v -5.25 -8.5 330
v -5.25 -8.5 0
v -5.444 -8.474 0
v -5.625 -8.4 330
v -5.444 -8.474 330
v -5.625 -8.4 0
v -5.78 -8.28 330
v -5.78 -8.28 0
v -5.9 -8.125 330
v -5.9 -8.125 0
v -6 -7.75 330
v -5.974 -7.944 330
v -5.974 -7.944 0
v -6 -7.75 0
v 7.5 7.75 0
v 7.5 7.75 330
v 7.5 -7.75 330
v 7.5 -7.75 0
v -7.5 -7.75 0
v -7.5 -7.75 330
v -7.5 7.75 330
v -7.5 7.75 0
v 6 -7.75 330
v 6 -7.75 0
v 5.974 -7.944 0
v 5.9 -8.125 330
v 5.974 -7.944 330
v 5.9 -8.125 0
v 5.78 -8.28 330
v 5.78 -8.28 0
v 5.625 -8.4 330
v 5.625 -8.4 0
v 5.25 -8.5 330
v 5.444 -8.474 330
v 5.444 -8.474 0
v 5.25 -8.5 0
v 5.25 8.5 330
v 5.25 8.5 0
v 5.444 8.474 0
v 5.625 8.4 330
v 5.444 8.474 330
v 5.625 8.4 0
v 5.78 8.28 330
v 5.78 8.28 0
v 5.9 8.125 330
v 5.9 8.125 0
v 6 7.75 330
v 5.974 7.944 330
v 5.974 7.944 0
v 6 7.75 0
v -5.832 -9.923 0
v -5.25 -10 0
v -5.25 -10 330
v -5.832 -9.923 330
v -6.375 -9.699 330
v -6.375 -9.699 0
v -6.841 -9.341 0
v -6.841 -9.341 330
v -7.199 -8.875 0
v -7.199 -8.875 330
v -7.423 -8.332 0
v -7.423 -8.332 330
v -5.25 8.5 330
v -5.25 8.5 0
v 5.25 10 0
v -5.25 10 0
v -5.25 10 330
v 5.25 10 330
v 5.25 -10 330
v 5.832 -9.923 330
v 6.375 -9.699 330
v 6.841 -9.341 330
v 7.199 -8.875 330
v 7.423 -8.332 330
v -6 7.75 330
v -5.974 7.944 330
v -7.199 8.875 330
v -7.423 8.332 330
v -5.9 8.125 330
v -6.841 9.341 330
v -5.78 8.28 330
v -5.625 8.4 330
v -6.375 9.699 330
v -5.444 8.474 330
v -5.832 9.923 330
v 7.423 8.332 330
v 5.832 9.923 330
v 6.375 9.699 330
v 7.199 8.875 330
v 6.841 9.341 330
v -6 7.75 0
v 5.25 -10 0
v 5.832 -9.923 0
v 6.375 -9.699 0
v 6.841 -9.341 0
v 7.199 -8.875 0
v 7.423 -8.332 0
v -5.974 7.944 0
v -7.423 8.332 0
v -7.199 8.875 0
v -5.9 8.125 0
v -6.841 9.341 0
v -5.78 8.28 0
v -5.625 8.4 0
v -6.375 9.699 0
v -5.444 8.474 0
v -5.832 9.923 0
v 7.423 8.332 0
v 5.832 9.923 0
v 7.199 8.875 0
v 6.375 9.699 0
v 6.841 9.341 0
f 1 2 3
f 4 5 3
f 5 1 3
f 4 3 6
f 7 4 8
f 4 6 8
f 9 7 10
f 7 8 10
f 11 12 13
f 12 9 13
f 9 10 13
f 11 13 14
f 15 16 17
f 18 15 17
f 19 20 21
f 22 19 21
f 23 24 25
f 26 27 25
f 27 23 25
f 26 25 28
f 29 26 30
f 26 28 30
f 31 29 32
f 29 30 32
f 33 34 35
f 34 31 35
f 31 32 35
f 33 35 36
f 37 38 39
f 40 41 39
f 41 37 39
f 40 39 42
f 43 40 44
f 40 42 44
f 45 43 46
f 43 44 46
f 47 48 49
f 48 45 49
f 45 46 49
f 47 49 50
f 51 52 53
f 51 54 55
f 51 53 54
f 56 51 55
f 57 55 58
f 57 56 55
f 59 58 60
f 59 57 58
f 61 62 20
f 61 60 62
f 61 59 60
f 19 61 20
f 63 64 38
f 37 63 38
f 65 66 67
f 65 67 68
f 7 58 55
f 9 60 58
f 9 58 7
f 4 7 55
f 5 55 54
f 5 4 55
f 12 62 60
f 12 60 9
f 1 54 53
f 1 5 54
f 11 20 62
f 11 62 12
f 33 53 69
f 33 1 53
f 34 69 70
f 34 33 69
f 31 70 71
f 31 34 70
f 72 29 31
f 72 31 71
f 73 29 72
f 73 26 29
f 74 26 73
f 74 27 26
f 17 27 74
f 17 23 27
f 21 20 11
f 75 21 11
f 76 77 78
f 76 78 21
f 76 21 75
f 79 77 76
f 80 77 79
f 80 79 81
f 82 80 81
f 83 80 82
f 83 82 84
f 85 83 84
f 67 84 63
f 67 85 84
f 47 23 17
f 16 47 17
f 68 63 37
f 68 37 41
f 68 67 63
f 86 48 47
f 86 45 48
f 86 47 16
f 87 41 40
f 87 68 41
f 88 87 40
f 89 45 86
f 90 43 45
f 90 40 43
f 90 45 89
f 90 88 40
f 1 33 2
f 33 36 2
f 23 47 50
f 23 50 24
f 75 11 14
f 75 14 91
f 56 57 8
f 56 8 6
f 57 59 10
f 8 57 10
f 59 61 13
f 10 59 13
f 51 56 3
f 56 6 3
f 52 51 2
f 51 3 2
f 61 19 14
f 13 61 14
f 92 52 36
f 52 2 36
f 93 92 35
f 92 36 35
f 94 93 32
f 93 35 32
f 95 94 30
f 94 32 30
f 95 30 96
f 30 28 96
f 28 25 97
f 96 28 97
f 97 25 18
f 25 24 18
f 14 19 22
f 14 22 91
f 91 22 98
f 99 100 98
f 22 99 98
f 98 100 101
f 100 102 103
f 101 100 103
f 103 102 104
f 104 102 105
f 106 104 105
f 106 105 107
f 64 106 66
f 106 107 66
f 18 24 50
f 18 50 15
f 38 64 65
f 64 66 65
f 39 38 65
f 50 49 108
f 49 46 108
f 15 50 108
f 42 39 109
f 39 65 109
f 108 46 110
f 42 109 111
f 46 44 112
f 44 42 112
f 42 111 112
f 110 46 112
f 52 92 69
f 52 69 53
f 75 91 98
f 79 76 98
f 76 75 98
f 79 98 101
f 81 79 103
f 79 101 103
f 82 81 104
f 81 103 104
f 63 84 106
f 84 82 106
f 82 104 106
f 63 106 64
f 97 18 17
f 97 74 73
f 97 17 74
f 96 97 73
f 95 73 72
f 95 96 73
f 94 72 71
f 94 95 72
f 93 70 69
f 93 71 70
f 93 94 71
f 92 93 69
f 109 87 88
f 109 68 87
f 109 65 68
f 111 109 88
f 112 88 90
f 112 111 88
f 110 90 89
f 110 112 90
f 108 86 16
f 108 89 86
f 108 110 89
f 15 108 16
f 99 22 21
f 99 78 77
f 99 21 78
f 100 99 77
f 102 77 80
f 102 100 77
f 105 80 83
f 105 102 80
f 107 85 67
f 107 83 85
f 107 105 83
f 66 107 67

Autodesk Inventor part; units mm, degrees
ref_plane "Start plane" through (0, 0, 0) normal (0, 0, 1) x (1, 0, 0)
ref_plane "End plane" through (0, 0, 330) normal (0, 0, 1) x (1, 0, 0)
sketch "Sketch" plane through (0, 0, 0) normal (0, 0, 1) x (1, 0, 0)
  line L0 (-7.5, -7.75) -> (-7.5, 7.75)
  line L1 (-5.25, 10) -> (5.25, 10)
  line L2 (7.5, 7.75) -> (7.5, -7.75)
  line L3 (5.25, -10) -> (-5.25, -10)
  arc A0 (-7.5, -7.75) -> (-5.25, -10) centre (-5.25, -7.75) ccw
  arc A1 (-5.25, 10) -> (-7.5, 7.75) centre (-5.25, 7.75) ccw
  arc A2 (7.5, 7.75) -> (5.25, 10) centre (5.25, 7.75) ccw
  arc A3 (5.25, -10) -> (7.5, -7.75) centre (5.25, -7.75) ccw
  arc A4 (-5.25, 8.5) -> (-6, 7.75) centre (-5.25, 7.75) ccw
  line L4 (-5.25, 8.5) -> (5.25, 8.5)
  arc A5 (6, 7.75) -> (5.25, 8.5) centre (5.25, 7.75) ccw
  line L5 (6, 7.75) -> (6, -7.75)
  arc A6 (5.25, -8.5) -> (6, -7.75) centre (5.25, -7.75) ccw
  line L6 (5.25, -8.5) -> (-5.25, -8.5)
  arc A7 (-6, -7.75) -> (-5.25, -8.5) centre (-5.25, -7.75) ccw
  line L7 (-6, -7.75) -> (-6, 7.75)
  line L8 (0, 14.6524) -> (0, -14.6524) construction
  line L9 (-11.5592, 0) -> (13.5932, 0) construction
  dimension "d7" = 2.25
  dimension "d10" = 20
  dimension "d11" = 15
  dimension "d12" = 1.5
  dimension "d15" = 10
  dimension "d16" = 7.5
extrude "Body" add sketch "Sketch" along normal up to surface (330 mm away) from surface at 0
sketch "Sketch3" plane through (0, 0, 0) normal (0, 0, 1) x (1, 0, 0)
  line L0 (0, 0) -> (10, 0)
ref_plane "Work Plane3" through (0, 0, 0) normal (0, -1, 0) x (1, 0, 0)
sketch "Sketch4" plane through (0, 0, 0) normal (0, -1, 0) x (1, 0, 0)
  line L0 (-2, 0) -> (12, 0)
  line L1 (-2, 330) -> (12, 330)
  dimension "d18" = 330
ref_plane "Work Plane4" through (39.5, -55, 0) normal (0, 0, -1) x (-1, 0, 0)
split "Split1" plane through (39.5, -55, 0) removes the side toward (0, 0, -1)
ref_plane "Work Plane5" through (-4.5, -55, 330) normal (0, 0, 1) x (1, 0, 0)
split "Split2" plane through (-4.5, -55, 330) removes the side toward (0, 0, 1)
equation "\"d7\" = G_IR"
equation "\"d10\" = G_H"
equation "\"d11\" = G_W"
equation "\"d12\" = G_T"
equation "\"d15\" = 0.5 * d10"
equation "\"d16\" = 0.5 * d11"
equation "\"d3\" = G_L"
equation "\"G_W\" = 15"
equation "\"G_H\" = 20"
equation "\"G_T\" = 1.5"
equation "\"G_IR\" = 2.25"
equation "\"G_L\" = d18"
equation "\"G_OFFSET_START\" = 0"
equation "\"G_OFFSET_END\" = -40"
equation "\"d14\" = G_OFFSET_END + B_L"
equation "\"B_L\" = 370"
properties part number "UNI EN 10305-5 - 20 x 15 x 1,5  - 330" material "Steel, Mild"
